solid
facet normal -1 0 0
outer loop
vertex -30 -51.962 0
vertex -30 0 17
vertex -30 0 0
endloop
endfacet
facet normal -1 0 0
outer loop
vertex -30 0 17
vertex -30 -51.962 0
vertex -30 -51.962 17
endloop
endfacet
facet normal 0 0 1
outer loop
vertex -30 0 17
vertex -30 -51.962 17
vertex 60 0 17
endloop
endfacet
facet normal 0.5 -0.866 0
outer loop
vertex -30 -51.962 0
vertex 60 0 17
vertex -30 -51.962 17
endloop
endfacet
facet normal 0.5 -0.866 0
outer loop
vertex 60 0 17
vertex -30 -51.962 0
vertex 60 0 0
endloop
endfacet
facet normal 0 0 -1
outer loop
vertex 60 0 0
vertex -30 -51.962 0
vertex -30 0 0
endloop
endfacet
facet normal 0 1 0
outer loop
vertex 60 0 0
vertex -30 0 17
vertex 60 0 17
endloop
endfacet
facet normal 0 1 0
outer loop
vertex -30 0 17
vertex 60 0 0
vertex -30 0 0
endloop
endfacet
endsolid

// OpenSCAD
WIDTH = 17;
LENGTH = 60;
HEIGHT = 60;

difference() {
    cylinder(WIDTH, LENGTH, LENGTH, $fn=3, center=false);
    translate([-100, 0, -0.001]) {
        cube([LENGTH * 100, LENGTH * 100, LENGTH * 100]);
    }
}
